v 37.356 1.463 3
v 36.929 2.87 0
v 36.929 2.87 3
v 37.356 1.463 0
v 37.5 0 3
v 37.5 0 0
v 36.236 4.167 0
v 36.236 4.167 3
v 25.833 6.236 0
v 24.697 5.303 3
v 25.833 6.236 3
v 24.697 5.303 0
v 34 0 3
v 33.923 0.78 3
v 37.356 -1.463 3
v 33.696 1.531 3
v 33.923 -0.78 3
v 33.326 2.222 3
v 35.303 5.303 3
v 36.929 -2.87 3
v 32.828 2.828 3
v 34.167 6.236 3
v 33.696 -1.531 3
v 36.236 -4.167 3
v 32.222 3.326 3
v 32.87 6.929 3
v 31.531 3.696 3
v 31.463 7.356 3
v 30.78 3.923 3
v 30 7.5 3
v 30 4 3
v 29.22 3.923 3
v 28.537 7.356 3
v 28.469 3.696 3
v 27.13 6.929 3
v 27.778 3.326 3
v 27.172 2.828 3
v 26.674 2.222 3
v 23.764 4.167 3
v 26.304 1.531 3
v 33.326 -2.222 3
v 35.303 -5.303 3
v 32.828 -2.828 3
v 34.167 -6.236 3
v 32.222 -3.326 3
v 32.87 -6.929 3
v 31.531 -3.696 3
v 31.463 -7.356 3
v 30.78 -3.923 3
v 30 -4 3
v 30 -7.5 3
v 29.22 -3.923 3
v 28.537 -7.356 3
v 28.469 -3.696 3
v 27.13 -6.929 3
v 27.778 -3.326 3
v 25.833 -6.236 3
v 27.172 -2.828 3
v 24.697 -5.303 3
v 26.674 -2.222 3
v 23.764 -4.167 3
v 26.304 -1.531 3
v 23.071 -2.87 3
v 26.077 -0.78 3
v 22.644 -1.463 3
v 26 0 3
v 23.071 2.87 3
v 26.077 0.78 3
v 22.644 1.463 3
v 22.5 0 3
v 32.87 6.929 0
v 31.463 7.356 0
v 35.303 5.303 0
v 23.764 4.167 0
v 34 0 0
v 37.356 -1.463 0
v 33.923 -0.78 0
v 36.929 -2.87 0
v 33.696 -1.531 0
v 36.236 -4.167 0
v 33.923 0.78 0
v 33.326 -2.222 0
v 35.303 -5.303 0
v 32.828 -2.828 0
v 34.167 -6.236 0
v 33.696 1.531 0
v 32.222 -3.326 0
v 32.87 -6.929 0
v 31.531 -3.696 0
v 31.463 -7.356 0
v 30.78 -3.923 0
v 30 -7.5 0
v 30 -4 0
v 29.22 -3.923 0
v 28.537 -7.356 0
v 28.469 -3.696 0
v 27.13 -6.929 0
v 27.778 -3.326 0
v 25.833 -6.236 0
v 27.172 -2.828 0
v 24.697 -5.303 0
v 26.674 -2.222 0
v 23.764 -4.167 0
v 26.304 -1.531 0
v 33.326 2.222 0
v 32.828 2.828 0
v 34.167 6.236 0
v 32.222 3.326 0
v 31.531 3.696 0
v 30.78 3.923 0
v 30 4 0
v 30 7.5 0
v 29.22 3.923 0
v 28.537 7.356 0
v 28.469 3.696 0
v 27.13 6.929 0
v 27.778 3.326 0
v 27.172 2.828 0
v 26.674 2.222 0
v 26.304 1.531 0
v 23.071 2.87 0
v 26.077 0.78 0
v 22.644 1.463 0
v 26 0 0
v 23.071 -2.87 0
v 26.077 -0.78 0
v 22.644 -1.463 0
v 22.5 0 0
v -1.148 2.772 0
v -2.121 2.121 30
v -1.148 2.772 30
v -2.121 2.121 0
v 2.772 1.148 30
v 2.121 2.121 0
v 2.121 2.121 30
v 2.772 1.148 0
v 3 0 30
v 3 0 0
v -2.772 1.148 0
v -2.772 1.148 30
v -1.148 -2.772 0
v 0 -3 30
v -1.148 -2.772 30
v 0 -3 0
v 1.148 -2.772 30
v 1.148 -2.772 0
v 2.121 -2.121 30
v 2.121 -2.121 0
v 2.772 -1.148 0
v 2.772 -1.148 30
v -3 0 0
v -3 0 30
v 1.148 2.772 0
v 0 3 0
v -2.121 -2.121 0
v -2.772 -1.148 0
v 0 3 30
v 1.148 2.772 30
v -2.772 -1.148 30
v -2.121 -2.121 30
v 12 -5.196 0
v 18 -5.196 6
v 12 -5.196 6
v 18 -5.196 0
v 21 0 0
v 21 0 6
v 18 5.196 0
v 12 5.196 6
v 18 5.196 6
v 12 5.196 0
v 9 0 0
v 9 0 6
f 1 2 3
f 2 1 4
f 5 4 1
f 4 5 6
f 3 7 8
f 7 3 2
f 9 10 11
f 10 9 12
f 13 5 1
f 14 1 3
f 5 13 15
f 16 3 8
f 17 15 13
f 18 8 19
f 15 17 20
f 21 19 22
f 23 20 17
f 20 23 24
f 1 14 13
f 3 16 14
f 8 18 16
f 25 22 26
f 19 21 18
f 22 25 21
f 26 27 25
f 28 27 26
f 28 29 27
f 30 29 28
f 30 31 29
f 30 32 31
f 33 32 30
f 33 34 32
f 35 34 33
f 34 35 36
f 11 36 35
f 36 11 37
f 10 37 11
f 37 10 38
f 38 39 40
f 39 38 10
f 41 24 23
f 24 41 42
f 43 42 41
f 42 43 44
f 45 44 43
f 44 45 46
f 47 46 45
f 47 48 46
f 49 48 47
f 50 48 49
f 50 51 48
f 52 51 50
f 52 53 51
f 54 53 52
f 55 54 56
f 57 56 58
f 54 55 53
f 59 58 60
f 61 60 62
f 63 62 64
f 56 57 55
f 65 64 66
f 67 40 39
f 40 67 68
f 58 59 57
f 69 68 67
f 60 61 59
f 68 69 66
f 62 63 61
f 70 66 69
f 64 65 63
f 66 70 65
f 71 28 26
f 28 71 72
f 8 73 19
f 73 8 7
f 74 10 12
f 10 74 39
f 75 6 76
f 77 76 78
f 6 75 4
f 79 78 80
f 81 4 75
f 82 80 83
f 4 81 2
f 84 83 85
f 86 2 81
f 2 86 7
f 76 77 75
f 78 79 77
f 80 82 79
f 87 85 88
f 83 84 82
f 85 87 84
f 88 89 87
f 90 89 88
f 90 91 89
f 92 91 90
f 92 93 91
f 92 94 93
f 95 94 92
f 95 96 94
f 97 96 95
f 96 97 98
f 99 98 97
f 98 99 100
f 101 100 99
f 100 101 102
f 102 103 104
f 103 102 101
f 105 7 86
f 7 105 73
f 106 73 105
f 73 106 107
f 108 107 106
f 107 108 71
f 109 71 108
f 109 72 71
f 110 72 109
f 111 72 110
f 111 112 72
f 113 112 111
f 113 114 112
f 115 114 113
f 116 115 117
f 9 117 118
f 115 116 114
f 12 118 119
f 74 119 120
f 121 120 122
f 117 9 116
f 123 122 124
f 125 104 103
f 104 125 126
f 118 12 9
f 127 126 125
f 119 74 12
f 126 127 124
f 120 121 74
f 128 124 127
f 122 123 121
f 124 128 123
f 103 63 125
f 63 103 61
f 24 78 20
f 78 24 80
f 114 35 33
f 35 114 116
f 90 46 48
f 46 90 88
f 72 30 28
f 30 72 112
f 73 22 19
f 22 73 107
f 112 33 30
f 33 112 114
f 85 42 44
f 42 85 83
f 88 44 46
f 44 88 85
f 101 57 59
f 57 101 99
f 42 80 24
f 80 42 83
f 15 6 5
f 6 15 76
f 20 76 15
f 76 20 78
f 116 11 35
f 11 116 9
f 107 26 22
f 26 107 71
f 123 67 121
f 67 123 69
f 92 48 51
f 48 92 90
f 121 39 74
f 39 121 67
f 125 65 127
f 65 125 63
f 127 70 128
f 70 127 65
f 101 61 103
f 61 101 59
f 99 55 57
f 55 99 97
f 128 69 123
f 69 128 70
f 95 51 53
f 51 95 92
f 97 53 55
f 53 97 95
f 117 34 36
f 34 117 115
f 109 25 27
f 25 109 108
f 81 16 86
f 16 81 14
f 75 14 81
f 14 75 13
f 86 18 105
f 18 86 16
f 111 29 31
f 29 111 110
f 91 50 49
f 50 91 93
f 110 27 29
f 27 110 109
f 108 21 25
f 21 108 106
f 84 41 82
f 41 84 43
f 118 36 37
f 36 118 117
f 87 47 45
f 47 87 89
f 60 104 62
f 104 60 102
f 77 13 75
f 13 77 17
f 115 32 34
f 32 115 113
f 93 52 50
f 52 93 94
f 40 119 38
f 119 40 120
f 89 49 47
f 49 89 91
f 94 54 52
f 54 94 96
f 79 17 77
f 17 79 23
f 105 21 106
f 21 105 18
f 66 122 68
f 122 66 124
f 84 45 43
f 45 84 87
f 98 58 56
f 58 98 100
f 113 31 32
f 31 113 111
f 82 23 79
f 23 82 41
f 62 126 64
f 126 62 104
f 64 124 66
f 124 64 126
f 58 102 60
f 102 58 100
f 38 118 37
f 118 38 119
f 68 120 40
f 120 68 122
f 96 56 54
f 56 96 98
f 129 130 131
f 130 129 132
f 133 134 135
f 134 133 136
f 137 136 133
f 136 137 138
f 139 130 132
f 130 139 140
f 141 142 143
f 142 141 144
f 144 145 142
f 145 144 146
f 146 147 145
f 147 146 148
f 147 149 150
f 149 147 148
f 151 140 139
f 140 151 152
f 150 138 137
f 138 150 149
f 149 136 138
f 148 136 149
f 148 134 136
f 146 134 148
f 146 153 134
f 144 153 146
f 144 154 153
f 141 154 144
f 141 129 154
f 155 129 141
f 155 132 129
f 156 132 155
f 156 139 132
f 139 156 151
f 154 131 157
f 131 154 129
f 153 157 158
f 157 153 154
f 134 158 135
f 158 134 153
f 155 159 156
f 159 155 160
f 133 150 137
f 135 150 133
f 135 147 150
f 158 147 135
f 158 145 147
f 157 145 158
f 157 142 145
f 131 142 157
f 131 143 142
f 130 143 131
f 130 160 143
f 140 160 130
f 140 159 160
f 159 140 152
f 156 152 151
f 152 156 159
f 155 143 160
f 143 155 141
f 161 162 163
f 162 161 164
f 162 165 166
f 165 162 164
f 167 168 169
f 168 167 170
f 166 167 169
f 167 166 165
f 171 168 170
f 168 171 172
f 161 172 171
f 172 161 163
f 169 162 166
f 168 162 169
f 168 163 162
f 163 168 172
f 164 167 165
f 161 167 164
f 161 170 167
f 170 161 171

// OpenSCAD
// file: lib/hardware.scad
// Simple hardware library for testing use statements

module Bolt(length = 20, diameter = 5) {
    cylinder(h = length, d = diameter, $fn = 16);
}

module Nut(size = 10) {
    cylinder(h = size/2, d = size, $fn = 6);
}

module Washer(outer = 12, inner = 6, thickness = 2) {
    difference() {
        cylinder(h = thickness, d = outer, $fn = 32);
        cylinder(h = thickness + 1, d = inner, $fn = 32);
    }
}
// main file
// Test use statement with external file
use <lib/hardware.scad>

// Use imported modules
translate([0, 0, 0]) Bolt(length = 30, diameter = 6);
translate([15, 0, 0]) Nut(size = 12);
translate([30, 0, 0]) Washer(outer = 15, inner = 8, thickness = 3);
